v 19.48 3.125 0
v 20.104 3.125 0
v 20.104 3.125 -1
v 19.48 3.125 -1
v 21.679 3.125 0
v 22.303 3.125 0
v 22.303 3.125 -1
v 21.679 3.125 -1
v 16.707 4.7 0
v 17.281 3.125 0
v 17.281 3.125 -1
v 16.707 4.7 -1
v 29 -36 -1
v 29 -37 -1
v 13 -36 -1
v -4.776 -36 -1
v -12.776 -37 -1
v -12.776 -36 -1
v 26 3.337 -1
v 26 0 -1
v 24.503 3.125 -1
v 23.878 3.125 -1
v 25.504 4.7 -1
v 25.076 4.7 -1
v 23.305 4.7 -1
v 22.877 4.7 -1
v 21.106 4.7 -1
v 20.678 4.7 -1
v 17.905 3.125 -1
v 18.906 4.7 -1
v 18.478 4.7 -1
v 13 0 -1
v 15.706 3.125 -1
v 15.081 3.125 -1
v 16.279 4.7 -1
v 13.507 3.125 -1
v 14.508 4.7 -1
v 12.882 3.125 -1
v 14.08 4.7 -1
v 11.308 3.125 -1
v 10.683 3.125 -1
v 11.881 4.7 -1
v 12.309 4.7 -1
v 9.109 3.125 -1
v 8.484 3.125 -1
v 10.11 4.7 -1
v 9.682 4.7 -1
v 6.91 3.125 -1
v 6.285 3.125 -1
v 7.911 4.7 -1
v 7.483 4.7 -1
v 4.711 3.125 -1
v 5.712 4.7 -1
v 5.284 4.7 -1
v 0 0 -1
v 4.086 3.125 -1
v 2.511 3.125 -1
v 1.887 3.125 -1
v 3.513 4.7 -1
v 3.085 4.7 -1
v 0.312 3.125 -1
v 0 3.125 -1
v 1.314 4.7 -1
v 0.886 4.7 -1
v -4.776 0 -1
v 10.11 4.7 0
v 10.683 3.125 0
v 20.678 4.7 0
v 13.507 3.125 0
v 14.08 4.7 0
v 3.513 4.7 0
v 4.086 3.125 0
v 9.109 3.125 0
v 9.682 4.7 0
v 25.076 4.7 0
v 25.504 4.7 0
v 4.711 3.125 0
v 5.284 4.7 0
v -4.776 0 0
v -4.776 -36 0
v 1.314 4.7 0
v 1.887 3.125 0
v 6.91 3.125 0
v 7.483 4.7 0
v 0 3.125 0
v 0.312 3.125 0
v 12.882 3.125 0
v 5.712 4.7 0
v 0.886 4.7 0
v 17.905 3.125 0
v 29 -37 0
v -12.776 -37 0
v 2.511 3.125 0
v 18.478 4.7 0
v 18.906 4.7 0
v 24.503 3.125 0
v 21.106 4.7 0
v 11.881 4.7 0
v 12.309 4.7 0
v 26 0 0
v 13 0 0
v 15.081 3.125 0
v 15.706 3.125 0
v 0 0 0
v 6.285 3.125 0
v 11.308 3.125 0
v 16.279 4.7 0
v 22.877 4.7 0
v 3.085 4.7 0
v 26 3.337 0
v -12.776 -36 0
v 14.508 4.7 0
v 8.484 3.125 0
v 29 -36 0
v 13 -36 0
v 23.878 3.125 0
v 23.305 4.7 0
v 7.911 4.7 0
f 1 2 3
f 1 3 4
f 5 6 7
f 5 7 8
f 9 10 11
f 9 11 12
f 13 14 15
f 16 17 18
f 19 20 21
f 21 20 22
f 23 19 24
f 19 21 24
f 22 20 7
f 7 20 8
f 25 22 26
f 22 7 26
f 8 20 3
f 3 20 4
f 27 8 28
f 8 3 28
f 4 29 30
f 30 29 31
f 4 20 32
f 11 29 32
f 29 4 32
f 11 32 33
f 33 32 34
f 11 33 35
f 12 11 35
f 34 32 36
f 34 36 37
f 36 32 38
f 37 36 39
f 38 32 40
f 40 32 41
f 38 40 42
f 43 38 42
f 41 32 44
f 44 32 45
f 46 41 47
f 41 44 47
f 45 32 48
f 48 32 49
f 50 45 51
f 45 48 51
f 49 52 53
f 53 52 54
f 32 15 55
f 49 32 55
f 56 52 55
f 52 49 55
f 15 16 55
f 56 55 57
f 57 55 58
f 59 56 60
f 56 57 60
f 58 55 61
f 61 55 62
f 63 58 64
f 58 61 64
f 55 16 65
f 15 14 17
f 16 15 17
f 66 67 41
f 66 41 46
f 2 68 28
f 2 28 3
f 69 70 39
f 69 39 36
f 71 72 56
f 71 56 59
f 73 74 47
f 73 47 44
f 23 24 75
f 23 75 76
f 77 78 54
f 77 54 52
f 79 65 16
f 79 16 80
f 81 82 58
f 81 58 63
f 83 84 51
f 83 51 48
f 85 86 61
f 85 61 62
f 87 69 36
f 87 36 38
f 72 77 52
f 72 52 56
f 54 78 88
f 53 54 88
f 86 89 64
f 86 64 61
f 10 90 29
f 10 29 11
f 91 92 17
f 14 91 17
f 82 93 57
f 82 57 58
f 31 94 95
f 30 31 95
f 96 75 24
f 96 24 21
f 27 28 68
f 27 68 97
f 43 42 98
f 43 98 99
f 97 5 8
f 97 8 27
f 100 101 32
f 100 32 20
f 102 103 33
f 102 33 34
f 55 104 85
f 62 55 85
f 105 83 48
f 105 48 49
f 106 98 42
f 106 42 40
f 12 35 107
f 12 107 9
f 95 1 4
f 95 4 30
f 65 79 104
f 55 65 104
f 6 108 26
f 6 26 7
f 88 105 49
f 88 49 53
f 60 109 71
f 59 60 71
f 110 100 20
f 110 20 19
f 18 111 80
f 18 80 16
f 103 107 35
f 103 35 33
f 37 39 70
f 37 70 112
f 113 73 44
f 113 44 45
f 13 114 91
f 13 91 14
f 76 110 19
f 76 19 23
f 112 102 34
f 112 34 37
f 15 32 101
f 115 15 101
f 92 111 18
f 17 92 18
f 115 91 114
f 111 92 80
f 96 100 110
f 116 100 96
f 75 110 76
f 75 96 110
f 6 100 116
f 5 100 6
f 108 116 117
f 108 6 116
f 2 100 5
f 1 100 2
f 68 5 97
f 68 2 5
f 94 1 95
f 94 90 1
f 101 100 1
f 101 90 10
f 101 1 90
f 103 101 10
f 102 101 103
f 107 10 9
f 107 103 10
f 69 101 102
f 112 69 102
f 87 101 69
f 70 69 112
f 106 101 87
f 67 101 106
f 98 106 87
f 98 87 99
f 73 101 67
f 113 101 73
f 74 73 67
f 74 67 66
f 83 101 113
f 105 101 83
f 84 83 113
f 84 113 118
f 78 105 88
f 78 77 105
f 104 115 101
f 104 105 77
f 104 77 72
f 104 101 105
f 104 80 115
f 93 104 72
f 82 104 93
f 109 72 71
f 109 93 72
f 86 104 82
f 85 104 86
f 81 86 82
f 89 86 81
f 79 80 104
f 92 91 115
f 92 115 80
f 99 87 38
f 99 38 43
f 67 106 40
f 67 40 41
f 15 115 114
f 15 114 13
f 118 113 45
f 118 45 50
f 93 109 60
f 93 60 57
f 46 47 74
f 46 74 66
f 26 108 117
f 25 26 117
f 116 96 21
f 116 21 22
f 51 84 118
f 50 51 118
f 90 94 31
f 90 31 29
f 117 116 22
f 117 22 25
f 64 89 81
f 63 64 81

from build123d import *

# Parameters (mm, degrees)
BLANKSKE_W               = 26
BLANKSKE_H               = 4.7
BLANK_DEPTH              = 1
TOOTHCUTSIM_DEPTH        = 27.440310134
TEETHCUTS_COUNT          = 13
TEETHCUTS_PITCH          = 2.199114855
SKETCH3_W                = 17.77574145
SKETCH3_H                = 1
BOSS_EXTRUDE2_DEPTH      = 37
BOSS_EXTRUDE3_DEPTH      = 16
BOSS_EXTRUDE3_DEPTH_BACK = 25.775741
SKETCH4_W                = 1
SKETCH4_H                = 1


with BuildPart() as part:
    # BlankSke → Blank (new body)
    with BuildSketch(Plane.XY):
        with Locations((13, 2.35)):
            Rectangle(BLANKSKE_W, BLANKSKE_H)
    extrude(amount=-BLANK_DEPTH)

    # TooCutSkeSim → ToothCutSim (cut, through all)
    with BuildSketch(Plane.XY):
        Polygon((0.312304759, 3.125), (-0.312304759, 3.125), (-0.894802722, 4.7254), (0.894802722, 4.7254), align=None)
    toothcutsim = extrude(amount=-TOOTHCUTSIM_DEPTH, mode=Mode.SUBTRACT)

    # TeethCuts: ToothCutSim ×13
    with Locations(*[(i * TEETHCUTS_PITCH, 0, 0) for i in range(1, TEETHCUTS_COUNT)]):
        add(toothcutsim, mode=Mode.SUBTRACT)

    # Sketch3 → Boss-Extrude2 (add)
    with BuildSketch(Plane.XZ):
        with Locations((4.112129275, -0.5)):
            Rectangle(SKETCH3_W, SKETCH3_H)
    extrude(amount=BOSS_EXTRUDE2_DEPTH)

    # Sketch4 → Boss-Extrude3 (add, two sides: drawn at the far end of the back side and taken through both)
    with BuildSketch(Plane(origin=(13, 0, 0), x_dir=(0, 0, -1), z_dir=(1, 0, 0)).offset(-BOSS_EXTRUDE3_DEPTH_BACK)):
        with Locations((0.5, -36.5)):
            Rectangle(SKETCH4_W, SKETCH4_H)
    extrude(amount=BOSS_EXTRUDE3_DEPTH + BOSS_EXTRUDE3_DEPTH_BACK)


solid = part.part
